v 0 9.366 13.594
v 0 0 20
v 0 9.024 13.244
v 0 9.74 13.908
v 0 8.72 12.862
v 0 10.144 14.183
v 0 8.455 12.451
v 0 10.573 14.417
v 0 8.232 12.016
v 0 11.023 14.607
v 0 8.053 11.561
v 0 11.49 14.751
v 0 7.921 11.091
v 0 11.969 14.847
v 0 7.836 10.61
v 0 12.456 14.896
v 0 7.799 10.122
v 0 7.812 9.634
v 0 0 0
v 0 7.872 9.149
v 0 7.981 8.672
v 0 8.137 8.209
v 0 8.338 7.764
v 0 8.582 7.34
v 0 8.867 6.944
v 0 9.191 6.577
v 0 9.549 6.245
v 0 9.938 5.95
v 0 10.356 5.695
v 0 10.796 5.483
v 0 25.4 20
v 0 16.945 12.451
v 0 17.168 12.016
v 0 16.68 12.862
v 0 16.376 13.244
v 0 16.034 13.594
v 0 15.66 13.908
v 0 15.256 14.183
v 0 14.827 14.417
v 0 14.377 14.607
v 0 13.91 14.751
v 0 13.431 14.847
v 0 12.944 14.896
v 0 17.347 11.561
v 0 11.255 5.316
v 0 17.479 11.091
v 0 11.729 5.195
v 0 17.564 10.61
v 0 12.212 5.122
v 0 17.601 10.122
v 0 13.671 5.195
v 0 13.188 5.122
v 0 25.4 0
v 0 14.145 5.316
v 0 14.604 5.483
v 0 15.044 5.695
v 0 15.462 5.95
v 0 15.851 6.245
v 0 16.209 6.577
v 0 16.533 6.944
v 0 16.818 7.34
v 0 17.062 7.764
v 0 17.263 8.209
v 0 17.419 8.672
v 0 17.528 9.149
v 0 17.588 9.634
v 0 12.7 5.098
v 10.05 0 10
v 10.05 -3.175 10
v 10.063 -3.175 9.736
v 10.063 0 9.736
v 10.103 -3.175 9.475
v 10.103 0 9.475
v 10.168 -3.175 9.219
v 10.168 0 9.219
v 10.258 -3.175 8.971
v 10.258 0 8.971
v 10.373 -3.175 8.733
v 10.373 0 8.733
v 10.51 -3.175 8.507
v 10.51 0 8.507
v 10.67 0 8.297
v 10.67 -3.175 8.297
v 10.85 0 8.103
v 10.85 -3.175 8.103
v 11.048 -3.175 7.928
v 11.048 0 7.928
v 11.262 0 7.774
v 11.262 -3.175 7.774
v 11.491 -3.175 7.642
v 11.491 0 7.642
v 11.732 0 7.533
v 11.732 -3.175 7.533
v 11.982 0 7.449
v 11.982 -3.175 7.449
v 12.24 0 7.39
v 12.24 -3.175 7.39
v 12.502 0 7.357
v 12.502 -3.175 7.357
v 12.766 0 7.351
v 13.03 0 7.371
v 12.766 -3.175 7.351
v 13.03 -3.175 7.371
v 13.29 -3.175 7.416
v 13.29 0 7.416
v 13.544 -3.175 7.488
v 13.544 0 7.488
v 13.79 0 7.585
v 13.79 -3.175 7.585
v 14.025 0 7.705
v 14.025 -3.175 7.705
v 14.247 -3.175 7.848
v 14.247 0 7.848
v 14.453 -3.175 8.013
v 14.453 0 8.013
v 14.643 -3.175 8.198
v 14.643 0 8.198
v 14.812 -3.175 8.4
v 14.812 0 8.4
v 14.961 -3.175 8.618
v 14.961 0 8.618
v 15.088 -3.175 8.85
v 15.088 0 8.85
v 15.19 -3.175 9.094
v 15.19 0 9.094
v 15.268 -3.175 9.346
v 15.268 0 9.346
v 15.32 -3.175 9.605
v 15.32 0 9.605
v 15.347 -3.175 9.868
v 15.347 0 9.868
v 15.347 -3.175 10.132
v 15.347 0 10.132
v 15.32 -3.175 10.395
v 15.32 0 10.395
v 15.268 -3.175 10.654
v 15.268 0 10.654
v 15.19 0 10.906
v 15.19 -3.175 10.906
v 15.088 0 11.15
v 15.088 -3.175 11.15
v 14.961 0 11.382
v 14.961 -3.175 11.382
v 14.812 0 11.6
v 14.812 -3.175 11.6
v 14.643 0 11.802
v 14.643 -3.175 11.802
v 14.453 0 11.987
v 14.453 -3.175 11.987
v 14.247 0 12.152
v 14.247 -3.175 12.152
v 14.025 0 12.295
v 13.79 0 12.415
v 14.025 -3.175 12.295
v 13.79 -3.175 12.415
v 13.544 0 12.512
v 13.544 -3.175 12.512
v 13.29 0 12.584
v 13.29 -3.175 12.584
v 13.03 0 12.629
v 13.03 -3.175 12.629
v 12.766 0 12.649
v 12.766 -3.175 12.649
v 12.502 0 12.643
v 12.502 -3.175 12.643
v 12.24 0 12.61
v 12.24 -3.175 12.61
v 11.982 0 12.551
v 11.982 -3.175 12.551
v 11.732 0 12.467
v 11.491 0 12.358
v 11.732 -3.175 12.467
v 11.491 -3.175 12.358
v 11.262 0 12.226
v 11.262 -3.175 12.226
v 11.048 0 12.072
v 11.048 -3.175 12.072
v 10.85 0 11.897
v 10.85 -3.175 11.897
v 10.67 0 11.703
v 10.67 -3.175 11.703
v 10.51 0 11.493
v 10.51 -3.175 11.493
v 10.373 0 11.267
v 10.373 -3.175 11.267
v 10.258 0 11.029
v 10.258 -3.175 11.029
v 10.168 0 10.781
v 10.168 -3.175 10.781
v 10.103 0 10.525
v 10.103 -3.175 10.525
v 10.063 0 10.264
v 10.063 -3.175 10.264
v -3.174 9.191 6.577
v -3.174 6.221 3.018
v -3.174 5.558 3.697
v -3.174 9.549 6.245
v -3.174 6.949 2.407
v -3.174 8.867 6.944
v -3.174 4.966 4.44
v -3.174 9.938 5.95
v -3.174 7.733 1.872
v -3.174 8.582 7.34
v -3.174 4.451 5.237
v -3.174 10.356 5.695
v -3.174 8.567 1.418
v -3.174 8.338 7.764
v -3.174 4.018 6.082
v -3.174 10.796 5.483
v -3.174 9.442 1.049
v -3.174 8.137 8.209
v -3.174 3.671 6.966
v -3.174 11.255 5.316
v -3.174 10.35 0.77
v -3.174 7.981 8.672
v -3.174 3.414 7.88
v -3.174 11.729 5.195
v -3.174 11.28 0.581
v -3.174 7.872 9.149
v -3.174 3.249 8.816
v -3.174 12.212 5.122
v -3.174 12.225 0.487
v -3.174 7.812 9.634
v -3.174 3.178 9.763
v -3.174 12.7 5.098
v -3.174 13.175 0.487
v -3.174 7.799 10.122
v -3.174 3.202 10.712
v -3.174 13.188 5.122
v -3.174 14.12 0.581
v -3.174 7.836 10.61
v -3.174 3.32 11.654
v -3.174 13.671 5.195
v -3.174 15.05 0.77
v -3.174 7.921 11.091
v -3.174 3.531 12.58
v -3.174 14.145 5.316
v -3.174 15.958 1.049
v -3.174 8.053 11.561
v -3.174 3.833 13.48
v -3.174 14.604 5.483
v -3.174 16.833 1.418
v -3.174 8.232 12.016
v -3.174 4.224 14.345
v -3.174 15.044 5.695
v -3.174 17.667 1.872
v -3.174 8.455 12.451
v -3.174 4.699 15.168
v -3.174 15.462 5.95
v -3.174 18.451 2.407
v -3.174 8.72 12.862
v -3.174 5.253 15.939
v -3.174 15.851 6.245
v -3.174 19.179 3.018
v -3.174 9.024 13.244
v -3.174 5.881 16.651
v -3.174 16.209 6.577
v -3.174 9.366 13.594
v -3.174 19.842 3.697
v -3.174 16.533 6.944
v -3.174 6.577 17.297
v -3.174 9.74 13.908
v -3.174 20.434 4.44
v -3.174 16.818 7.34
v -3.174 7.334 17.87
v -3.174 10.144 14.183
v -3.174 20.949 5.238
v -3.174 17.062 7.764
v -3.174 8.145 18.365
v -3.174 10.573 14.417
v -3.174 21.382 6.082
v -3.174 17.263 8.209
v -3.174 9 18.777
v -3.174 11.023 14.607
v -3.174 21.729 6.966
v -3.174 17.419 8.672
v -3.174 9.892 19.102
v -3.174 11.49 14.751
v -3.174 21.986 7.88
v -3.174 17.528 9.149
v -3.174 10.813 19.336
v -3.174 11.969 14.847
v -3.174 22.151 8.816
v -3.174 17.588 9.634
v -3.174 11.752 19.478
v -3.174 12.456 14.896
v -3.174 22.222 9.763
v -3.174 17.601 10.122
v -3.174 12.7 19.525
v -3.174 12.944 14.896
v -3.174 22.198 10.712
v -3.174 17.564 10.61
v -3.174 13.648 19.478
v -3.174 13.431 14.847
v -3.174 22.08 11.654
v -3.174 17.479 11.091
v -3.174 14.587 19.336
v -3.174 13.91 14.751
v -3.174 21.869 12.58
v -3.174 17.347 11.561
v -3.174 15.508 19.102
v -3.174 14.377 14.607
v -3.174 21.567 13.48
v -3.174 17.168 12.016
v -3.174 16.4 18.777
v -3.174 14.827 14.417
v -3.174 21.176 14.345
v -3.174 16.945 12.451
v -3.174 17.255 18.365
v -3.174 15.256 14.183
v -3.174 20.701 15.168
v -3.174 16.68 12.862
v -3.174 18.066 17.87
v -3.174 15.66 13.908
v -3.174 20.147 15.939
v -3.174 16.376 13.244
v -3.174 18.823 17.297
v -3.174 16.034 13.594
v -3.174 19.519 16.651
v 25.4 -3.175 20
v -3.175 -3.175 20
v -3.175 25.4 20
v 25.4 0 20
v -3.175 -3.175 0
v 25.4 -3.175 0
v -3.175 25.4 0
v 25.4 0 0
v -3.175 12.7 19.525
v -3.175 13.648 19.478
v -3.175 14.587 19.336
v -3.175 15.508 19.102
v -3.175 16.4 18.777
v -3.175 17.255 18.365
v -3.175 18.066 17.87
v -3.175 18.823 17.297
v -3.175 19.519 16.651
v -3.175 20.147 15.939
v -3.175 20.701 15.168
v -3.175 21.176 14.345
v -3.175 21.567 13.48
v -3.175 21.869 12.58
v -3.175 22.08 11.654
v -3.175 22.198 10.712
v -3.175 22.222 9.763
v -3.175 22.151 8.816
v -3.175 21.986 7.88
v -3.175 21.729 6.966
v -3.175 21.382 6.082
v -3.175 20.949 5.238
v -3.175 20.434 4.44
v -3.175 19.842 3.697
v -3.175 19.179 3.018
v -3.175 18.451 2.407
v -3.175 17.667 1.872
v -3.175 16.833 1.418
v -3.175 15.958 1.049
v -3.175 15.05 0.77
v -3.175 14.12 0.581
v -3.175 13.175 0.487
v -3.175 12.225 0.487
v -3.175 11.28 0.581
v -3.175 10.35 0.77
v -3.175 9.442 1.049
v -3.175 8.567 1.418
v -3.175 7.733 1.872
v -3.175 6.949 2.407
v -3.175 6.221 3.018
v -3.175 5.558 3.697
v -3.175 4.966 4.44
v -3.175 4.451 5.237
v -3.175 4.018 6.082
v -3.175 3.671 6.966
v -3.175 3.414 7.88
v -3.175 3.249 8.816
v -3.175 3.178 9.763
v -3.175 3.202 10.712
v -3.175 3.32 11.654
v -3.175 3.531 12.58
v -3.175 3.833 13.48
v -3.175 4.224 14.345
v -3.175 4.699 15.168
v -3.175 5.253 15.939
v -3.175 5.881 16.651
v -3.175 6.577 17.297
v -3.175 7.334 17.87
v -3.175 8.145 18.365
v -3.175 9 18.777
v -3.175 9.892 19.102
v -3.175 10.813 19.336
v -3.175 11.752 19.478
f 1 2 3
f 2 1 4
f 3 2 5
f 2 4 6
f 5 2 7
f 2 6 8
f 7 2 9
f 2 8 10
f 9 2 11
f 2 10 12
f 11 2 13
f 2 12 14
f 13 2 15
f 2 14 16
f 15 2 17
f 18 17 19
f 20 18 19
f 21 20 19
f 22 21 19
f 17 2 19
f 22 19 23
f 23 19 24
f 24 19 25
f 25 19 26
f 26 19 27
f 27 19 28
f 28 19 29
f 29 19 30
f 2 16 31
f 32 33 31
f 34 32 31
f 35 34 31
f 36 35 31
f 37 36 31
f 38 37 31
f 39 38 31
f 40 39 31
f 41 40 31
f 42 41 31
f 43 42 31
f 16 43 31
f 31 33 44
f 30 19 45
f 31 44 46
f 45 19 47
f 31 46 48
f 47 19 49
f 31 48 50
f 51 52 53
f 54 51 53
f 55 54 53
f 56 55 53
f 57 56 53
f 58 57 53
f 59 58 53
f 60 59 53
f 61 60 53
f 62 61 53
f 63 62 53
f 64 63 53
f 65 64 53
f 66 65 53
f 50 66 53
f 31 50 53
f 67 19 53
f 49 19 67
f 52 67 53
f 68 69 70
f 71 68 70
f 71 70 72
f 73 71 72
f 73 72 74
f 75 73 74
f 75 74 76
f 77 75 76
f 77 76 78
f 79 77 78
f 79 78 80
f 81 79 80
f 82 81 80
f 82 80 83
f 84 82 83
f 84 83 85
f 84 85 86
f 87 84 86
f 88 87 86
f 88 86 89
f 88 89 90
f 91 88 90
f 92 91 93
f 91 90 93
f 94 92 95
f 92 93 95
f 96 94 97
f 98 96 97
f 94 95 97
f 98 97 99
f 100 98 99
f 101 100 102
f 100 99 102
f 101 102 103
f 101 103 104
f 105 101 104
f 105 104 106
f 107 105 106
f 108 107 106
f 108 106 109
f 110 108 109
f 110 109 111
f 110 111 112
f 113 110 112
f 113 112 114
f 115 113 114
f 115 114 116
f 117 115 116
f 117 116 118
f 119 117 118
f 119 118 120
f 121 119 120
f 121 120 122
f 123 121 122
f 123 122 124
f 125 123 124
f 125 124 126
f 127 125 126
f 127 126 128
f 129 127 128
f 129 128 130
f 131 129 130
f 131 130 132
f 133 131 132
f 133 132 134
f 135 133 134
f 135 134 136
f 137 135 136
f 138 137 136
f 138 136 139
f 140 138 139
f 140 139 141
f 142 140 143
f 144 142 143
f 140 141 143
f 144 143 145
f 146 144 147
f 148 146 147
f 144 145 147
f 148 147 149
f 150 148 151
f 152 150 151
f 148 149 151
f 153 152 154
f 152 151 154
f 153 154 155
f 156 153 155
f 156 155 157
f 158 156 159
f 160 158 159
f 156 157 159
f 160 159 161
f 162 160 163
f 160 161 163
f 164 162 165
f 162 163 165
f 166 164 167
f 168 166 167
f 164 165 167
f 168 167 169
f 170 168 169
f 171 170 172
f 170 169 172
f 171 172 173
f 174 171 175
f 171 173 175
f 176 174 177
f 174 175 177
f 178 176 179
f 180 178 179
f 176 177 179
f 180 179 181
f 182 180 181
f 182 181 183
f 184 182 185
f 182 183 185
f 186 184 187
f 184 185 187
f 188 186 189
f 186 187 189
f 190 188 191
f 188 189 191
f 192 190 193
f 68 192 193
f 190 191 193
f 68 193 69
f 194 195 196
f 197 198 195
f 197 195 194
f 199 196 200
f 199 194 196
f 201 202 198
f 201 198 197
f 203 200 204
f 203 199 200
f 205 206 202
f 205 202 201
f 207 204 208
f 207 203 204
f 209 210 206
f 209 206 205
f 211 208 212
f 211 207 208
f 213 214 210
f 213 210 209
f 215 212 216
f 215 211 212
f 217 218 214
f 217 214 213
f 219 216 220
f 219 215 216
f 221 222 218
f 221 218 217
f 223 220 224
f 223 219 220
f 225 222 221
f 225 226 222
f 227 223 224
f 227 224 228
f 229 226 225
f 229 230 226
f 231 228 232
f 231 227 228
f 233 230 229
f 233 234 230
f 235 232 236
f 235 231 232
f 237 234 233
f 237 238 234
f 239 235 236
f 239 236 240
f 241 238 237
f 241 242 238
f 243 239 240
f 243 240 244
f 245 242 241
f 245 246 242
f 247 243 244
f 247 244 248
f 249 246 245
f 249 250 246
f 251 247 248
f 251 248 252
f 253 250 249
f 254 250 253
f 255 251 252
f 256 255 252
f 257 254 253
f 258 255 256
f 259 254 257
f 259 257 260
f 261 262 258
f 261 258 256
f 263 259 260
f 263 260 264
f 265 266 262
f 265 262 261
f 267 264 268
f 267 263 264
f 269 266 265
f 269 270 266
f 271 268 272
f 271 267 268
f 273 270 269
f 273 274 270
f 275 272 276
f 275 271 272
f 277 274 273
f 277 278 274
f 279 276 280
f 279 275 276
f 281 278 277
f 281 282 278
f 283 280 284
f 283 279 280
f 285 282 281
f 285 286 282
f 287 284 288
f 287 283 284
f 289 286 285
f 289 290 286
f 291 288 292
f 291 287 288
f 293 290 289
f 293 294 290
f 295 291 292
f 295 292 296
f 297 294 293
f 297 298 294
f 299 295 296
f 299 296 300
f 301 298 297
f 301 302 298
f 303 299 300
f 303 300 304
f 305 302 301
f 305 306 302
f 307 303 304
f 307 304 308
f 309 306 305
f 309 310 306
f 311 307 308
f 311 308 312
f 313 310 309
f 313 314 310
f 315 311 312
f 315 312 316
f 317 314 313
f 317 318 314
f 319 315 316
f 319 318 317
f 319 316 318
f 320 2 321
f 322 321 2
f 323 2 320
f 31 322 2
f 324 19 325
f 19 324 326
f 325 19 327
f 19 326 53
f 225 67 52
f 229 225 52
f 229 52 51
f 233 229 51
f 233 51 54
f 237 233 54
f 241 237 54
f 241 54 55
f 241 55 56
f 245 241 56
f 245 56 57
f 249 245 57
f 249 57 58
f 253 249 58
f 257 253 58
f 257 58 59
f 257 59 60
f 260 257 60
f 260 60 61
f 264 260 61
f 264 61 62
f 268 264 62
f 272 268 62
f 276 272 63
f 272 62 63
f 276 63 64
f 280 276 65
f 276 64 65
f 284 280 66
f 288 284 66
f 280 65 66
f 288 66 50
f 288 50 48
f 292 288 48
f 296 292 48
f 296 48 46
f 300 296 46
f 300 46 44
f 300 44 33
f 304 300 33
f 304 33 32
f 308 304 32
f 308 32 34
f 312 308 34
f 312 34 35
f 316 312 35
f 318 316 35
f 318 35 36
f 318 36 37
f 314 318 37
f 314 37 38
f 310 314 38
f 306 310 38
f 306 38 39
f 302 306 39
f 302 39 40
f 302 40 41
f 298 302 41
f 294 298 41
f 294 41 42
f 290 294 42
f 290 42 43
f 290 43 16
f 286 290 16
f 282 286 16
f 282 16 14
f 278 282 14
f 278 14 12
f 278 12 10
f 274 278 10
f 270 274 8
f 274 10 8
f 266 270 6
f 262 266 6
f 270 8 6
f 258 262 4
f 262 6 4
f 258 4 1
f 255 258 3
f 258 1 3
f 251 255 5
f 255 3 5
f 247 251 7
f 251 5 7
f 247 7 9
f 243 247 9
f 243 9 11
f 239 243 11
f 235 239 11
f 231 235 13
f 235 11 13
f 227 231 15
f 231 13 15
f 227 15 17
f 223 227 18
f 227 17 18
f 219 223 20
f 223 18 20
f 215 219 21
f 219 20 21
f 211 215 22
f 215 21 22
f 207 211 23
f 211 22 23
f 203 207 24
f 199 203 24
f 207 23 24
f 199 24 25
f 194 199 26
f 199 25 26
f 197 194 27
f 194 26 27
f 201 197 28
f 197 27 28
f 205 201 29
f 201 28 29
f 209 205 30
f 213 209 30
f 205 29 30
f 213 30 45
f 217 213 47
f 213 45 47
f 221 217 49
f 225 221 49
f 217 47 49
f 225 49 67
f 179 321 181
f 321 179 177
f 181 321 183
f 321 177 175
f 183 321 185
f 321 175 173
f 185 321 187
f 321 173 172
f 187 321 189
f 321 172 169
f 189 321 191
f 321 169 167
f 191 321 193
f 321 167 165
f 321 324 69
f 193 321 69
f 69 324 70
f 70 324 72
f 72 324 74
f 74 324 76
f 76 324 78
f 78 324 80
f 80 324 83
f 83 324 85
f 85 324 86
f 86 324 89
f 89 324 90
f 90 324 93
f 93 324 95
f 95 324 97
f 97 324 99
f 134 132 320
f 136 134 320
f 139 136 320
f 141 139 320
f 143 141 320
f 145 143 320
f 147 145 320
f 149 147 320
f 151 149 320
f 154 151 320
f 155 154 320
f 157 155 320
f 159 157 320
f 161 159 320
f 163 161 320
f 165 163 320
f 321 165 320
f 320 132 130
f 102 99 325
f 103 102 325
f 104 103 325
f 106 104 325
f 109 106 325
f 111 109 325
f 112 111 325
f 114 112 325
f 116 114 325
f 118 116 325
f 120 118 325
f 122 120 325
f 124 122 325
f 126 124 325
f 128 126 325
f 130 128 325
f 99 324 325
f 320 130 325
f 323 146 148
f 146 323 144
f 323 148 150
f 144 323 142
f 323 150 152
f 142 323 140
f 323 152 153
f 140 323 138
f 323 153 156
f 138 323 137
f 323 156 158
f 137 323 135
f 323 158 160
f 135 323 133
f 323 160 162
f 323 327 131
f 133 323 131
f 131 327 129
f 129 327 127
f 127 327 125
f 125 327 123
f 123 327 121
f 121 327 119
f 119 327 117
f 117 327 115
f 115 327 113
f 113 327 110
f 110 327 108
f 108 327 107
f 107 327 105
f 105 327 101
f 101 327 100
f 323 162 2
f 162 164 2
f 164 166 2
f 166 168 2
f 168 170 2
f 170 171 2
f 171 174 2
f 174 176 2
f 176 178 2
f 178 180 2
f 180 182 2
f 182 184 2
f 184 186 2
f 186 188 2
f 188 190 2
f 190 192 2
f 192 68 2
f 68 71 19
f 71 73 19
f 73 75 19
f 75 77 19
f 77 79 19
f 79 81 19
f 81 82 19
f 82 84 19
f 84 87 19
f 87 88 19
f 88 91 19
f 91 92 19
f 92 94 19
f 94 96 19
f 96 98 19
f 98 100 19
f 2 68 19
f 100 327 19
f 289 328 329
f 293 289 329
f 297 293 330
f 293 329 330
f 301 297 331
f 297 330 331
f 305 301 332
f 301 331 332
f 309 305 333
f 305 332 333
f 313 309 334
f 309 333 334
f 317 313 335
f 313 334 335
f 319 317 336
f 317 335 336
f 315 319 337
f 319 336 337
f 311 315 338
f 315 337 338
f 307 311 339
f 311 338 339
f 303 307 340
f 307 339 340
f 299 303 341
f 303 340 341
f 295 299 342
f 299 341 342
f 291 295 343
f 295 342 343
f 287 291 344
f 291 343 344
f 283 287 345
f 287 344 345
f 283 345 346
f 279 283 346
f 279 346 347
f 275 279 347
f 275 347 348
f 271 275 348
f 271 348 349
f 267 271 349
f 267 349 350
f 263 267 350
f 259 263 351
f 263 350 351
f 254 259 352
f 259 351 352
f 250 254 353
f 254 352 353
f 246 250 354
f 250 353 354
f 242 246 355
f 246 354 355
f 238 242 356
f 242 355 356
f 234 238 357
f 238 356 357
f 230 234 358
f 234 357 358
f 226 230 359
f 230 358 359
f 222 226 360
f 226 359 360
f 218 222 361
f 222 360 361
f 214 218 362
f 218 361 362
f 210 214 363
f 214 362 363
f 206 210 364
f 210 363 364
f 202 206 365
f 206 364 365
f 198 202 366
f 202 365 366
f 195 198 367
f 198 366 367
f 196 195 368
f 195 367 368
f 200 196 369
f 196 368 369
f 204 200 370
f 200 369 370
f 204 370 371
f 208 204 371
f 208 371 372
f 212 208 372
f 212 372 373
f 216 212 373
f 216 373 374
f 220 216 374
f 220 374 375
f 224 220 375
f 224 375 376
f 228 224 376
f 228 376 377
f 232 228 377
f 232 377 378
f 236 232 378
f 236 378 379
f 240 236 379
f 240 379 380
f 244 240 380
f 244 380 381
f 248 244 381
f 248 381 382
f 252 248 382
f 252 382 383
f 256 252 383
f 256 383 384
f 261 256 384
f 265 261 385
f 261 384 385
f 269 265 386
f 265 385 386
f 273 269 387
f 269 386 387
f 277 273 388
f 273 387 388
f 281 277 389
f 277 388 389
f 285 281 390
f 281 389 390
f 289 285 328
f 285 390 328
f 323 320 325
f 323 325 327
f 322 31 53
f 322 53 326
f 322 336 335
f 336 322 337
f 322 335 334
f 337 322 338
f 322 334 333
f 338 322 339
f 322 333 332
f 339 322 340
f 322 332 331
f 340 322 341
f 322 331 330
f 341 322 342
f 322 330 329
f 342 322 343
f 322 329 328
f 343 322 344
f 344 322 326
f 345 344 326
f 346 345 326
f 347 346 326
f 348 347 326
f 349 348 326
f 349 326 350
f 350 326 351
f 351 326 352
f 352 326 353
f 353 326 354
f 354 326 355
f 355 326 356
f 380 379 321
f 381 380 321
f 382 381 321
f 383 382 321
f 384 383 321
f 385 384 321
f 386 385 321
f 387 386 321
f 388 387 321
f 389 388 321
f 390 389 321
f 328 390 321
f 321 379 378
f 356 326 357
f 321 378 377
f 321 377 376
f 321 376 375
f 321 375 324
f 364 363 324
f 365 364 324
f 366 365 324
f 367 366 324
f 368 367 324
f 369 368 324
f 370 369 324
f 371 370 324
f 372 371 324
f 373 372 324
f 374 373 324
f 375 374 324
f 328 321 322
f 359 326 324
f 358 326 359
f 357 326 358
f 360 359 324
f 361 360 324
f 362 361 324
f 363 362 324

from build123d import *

# Parameters (mm, degrees)
BOSS_EXTRUDE1_DEPTH     = 20
F_3_8_CLEARANCE_HOLE1_D = 9.8044
M5_CLEARANCE_HOLE1_D    = 5.3
SKETCH2_R               = 9.525
CUT_EXTRUDE1_DEPTH      = 0.001


with BuildPart() as part:
    # Sketch1 → Boss-Extrude1 (new body)
    with BuildSketch(Plane.XY):
        Polygon((0, 2.54), (0, 25.4), (-3.175, 25.4), (-3.175, -3.175), (25.4, -3.175), (25.4, 0), (2.54, 0), (0, 0), align=None)
    extrude(amount=BOSS_EXTRUDE1_DEPTH)

    # 3/8 Clearance Hole1 (through all)
    with Locations(Plane.ZY.offset(3.175)):
        with Locations((10, 12.7)):
            Hole(F_3_8_CLEARANCE_HOLE1_D / 2)

    # M5 Clearance Hole1 (through all)
    with Locations(Plane(origin=(0, 0, 0), x_dir=(1, 0, 0), z_dir=(0, 1, 0))):
        with Locations((12.7, -10)):
            Hole(M5_CLEARANCE_HOLE1_D / 2)

    # Sketch2 → Cut-Extrude1 (cut)
    with BuildSketch(Plane.ZY.offset(3.175)):
        with Locations((10, 12.7)):
            Circle(SKETCH2_R)
    extrude(amount=-CUT_EXTRUDE1_DEPTH, mode=Mode.SUBTRACT)


solid = part.part
